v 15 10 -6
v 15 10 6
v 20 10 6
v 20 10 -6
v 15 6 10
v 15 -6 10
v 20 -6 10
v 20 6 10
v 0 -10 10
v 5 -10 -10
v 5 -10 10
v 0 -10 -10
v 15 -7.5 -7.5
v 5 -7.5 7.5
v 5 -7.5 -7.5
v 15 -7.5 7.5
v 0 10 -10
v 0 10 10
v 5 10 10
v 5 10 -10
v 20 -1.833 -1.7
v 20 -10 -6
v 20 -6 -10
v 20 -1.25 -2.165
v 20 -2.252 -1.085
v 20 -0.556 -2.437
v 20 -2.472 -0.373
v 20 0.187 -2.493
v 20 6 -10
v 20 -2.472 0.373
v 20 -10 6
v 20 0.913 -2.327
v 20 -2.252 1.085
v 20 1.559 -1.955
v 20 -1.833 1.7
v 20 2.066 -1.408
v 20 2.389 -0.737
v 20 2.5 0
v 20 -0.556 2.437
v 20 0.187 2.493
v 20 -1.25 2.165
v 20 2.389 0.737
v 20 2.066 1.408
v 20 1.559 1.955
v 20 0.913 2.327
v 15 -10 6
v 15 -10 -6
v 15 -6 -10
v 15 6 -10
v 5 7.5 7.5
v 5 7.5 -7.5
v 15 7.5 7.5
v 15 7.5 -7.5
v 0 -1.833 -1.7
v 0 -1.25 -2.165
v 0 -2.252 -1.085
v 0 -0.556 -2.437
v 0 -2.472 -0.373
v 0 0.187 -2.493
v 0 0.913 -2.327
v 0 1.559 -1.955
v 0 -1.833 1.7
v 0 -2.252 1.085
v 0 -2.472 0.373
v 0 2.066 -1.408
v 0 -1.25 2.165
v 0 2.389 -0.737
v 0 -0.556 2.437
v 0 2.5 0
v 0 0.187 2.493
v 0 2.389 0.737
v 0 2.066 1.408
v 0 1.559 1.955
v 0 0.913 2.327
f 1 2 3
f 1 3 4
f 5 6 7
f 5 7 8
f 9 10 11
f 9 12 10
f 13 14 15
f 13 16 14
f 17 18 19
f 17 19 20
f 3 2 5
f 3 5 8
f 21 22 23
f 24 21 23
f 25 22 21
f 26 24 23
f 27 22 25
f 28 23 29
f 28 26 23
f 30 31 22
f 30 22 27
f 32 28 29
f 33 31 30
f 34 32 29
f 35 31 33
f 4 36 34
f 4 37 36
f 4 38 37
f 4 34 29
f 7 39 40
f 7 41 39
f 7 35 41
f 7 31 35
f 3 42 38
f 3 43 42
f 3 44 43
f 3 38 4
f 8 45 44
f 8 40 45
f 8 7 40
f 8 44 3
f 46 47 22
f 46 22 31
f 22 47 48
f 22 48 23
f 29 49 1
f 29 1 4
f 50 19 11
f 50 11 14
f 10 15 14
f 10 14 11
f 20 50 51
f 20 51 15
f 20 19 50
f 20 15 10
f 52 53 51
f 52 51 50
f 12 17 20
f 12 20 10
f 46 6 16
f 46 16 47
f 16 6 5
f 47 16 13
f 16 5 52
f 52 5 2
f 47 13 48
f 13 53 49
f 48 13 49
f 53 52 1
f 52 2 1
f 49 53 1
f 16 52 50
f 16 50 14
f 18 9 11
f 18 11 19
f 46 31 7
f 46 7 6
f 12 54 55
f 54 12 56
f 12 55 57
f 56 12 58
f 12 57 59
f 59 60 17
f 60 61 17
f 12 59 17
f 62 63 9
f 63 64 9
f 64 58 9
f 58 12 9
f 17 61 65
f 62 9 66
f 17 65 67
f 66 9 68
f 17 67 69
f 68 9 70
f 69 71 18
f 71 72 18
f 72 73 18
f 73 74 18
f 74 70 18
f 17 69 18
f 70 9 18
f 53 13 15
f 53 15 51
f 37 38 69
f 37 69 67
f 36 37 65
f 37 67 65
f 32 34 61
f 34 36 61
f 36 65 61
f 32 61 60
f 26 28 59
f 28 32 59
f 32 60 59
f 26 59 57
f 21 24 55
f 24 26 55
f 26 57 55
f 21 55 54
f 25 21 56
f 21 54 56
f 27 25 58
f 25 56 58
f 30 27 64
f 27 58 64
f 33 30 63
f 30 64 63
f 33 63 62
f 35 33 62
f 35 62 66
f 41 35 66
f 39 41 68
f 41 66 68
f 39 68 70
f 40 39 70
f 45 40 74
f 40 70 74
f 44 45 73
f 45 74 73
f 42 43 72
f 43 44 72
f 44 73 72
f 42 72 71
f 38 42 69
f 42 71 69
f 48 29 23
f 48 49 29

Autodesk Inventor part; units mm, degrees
ref_plane "YZ Plane" through (0, 0, 0) normal (1, 0, 0) x (0, 1, 0)
ref_plane "XZ Plane" through (0, 0, 0) normal (0, 1, 0) x (-1, 0, 0)
sketch "Sketch1" plane through (0, 0, 0) normal (1, 0, 0) x (0, 1, 0)
  circle A0 centre (0, 0) radius 2.5
  line L0 (-10, 10) -> (10, 10)
  line L1 (10, 10) -> (10, -10)
  line L2 (10, -10) -> (-10, -10)
  line L3 (-10, -10) -> (-10, 10)
  line L4 (-10, 10) -> (10, -10) construction
  line L5 (10, 10) -> (-10, -10) construction
  dimension "d0" = 5
  dimension "d1" = 20
  dimension "d2" = 20
extrude "Extrusion1" add sketch "Sketch1" along normal blind 20
ref_plane "Work Plane1" through (15, 0, 0) normal (1, 0, 0) x (0, 0, -1)
sketch "Sketch2" plane through (15, 0, 0) normal (1, 0, 0) x (0, 0, -1)
  line L0 (10, -10) -> (10, 10) projected
  line L1 (-10, -10) -> (10, -10)
  line L2 (10, -10) -> (10, 10)
  line L3 (10, 10) -> (-10, 10)
  line L4 (-10, 10) -> (-10, -10)
  line L5 (-10, -10) -> (10, 10) construction
  line L6 (10, -10) -> (-10, 10) construction
  line L7 (-7.5, -7.5) -> (7.5, -7.5)
  line L8 (7.5, -7.5) -> (7.5, 7.5)
  line L9 (7.5, 7.5) -> (-7.5, 7.5)
  line L10 (-7.5, 7.5) -> (-7.5, -7.5)
  line L11 (-7.5, -7.5) -> (7.5, 7.5) construction
  line L12 (7.5, -7.5) -> (-7.5, 7.5) construction
  point P0 (0, 0)
  dimension "d6" = 15
  dimension "d7" = 15
extrude "Extrusion2" cut sketch "Sketch2" against normal blind 10
chamfer "Chamfer1" distance 4 angle 45 4 edges at (17.5, 10, 10) (17.5, 10, -10) (17.5, -10, -10) (17.5, -10, 10)
properties part number "Servo Motor"
